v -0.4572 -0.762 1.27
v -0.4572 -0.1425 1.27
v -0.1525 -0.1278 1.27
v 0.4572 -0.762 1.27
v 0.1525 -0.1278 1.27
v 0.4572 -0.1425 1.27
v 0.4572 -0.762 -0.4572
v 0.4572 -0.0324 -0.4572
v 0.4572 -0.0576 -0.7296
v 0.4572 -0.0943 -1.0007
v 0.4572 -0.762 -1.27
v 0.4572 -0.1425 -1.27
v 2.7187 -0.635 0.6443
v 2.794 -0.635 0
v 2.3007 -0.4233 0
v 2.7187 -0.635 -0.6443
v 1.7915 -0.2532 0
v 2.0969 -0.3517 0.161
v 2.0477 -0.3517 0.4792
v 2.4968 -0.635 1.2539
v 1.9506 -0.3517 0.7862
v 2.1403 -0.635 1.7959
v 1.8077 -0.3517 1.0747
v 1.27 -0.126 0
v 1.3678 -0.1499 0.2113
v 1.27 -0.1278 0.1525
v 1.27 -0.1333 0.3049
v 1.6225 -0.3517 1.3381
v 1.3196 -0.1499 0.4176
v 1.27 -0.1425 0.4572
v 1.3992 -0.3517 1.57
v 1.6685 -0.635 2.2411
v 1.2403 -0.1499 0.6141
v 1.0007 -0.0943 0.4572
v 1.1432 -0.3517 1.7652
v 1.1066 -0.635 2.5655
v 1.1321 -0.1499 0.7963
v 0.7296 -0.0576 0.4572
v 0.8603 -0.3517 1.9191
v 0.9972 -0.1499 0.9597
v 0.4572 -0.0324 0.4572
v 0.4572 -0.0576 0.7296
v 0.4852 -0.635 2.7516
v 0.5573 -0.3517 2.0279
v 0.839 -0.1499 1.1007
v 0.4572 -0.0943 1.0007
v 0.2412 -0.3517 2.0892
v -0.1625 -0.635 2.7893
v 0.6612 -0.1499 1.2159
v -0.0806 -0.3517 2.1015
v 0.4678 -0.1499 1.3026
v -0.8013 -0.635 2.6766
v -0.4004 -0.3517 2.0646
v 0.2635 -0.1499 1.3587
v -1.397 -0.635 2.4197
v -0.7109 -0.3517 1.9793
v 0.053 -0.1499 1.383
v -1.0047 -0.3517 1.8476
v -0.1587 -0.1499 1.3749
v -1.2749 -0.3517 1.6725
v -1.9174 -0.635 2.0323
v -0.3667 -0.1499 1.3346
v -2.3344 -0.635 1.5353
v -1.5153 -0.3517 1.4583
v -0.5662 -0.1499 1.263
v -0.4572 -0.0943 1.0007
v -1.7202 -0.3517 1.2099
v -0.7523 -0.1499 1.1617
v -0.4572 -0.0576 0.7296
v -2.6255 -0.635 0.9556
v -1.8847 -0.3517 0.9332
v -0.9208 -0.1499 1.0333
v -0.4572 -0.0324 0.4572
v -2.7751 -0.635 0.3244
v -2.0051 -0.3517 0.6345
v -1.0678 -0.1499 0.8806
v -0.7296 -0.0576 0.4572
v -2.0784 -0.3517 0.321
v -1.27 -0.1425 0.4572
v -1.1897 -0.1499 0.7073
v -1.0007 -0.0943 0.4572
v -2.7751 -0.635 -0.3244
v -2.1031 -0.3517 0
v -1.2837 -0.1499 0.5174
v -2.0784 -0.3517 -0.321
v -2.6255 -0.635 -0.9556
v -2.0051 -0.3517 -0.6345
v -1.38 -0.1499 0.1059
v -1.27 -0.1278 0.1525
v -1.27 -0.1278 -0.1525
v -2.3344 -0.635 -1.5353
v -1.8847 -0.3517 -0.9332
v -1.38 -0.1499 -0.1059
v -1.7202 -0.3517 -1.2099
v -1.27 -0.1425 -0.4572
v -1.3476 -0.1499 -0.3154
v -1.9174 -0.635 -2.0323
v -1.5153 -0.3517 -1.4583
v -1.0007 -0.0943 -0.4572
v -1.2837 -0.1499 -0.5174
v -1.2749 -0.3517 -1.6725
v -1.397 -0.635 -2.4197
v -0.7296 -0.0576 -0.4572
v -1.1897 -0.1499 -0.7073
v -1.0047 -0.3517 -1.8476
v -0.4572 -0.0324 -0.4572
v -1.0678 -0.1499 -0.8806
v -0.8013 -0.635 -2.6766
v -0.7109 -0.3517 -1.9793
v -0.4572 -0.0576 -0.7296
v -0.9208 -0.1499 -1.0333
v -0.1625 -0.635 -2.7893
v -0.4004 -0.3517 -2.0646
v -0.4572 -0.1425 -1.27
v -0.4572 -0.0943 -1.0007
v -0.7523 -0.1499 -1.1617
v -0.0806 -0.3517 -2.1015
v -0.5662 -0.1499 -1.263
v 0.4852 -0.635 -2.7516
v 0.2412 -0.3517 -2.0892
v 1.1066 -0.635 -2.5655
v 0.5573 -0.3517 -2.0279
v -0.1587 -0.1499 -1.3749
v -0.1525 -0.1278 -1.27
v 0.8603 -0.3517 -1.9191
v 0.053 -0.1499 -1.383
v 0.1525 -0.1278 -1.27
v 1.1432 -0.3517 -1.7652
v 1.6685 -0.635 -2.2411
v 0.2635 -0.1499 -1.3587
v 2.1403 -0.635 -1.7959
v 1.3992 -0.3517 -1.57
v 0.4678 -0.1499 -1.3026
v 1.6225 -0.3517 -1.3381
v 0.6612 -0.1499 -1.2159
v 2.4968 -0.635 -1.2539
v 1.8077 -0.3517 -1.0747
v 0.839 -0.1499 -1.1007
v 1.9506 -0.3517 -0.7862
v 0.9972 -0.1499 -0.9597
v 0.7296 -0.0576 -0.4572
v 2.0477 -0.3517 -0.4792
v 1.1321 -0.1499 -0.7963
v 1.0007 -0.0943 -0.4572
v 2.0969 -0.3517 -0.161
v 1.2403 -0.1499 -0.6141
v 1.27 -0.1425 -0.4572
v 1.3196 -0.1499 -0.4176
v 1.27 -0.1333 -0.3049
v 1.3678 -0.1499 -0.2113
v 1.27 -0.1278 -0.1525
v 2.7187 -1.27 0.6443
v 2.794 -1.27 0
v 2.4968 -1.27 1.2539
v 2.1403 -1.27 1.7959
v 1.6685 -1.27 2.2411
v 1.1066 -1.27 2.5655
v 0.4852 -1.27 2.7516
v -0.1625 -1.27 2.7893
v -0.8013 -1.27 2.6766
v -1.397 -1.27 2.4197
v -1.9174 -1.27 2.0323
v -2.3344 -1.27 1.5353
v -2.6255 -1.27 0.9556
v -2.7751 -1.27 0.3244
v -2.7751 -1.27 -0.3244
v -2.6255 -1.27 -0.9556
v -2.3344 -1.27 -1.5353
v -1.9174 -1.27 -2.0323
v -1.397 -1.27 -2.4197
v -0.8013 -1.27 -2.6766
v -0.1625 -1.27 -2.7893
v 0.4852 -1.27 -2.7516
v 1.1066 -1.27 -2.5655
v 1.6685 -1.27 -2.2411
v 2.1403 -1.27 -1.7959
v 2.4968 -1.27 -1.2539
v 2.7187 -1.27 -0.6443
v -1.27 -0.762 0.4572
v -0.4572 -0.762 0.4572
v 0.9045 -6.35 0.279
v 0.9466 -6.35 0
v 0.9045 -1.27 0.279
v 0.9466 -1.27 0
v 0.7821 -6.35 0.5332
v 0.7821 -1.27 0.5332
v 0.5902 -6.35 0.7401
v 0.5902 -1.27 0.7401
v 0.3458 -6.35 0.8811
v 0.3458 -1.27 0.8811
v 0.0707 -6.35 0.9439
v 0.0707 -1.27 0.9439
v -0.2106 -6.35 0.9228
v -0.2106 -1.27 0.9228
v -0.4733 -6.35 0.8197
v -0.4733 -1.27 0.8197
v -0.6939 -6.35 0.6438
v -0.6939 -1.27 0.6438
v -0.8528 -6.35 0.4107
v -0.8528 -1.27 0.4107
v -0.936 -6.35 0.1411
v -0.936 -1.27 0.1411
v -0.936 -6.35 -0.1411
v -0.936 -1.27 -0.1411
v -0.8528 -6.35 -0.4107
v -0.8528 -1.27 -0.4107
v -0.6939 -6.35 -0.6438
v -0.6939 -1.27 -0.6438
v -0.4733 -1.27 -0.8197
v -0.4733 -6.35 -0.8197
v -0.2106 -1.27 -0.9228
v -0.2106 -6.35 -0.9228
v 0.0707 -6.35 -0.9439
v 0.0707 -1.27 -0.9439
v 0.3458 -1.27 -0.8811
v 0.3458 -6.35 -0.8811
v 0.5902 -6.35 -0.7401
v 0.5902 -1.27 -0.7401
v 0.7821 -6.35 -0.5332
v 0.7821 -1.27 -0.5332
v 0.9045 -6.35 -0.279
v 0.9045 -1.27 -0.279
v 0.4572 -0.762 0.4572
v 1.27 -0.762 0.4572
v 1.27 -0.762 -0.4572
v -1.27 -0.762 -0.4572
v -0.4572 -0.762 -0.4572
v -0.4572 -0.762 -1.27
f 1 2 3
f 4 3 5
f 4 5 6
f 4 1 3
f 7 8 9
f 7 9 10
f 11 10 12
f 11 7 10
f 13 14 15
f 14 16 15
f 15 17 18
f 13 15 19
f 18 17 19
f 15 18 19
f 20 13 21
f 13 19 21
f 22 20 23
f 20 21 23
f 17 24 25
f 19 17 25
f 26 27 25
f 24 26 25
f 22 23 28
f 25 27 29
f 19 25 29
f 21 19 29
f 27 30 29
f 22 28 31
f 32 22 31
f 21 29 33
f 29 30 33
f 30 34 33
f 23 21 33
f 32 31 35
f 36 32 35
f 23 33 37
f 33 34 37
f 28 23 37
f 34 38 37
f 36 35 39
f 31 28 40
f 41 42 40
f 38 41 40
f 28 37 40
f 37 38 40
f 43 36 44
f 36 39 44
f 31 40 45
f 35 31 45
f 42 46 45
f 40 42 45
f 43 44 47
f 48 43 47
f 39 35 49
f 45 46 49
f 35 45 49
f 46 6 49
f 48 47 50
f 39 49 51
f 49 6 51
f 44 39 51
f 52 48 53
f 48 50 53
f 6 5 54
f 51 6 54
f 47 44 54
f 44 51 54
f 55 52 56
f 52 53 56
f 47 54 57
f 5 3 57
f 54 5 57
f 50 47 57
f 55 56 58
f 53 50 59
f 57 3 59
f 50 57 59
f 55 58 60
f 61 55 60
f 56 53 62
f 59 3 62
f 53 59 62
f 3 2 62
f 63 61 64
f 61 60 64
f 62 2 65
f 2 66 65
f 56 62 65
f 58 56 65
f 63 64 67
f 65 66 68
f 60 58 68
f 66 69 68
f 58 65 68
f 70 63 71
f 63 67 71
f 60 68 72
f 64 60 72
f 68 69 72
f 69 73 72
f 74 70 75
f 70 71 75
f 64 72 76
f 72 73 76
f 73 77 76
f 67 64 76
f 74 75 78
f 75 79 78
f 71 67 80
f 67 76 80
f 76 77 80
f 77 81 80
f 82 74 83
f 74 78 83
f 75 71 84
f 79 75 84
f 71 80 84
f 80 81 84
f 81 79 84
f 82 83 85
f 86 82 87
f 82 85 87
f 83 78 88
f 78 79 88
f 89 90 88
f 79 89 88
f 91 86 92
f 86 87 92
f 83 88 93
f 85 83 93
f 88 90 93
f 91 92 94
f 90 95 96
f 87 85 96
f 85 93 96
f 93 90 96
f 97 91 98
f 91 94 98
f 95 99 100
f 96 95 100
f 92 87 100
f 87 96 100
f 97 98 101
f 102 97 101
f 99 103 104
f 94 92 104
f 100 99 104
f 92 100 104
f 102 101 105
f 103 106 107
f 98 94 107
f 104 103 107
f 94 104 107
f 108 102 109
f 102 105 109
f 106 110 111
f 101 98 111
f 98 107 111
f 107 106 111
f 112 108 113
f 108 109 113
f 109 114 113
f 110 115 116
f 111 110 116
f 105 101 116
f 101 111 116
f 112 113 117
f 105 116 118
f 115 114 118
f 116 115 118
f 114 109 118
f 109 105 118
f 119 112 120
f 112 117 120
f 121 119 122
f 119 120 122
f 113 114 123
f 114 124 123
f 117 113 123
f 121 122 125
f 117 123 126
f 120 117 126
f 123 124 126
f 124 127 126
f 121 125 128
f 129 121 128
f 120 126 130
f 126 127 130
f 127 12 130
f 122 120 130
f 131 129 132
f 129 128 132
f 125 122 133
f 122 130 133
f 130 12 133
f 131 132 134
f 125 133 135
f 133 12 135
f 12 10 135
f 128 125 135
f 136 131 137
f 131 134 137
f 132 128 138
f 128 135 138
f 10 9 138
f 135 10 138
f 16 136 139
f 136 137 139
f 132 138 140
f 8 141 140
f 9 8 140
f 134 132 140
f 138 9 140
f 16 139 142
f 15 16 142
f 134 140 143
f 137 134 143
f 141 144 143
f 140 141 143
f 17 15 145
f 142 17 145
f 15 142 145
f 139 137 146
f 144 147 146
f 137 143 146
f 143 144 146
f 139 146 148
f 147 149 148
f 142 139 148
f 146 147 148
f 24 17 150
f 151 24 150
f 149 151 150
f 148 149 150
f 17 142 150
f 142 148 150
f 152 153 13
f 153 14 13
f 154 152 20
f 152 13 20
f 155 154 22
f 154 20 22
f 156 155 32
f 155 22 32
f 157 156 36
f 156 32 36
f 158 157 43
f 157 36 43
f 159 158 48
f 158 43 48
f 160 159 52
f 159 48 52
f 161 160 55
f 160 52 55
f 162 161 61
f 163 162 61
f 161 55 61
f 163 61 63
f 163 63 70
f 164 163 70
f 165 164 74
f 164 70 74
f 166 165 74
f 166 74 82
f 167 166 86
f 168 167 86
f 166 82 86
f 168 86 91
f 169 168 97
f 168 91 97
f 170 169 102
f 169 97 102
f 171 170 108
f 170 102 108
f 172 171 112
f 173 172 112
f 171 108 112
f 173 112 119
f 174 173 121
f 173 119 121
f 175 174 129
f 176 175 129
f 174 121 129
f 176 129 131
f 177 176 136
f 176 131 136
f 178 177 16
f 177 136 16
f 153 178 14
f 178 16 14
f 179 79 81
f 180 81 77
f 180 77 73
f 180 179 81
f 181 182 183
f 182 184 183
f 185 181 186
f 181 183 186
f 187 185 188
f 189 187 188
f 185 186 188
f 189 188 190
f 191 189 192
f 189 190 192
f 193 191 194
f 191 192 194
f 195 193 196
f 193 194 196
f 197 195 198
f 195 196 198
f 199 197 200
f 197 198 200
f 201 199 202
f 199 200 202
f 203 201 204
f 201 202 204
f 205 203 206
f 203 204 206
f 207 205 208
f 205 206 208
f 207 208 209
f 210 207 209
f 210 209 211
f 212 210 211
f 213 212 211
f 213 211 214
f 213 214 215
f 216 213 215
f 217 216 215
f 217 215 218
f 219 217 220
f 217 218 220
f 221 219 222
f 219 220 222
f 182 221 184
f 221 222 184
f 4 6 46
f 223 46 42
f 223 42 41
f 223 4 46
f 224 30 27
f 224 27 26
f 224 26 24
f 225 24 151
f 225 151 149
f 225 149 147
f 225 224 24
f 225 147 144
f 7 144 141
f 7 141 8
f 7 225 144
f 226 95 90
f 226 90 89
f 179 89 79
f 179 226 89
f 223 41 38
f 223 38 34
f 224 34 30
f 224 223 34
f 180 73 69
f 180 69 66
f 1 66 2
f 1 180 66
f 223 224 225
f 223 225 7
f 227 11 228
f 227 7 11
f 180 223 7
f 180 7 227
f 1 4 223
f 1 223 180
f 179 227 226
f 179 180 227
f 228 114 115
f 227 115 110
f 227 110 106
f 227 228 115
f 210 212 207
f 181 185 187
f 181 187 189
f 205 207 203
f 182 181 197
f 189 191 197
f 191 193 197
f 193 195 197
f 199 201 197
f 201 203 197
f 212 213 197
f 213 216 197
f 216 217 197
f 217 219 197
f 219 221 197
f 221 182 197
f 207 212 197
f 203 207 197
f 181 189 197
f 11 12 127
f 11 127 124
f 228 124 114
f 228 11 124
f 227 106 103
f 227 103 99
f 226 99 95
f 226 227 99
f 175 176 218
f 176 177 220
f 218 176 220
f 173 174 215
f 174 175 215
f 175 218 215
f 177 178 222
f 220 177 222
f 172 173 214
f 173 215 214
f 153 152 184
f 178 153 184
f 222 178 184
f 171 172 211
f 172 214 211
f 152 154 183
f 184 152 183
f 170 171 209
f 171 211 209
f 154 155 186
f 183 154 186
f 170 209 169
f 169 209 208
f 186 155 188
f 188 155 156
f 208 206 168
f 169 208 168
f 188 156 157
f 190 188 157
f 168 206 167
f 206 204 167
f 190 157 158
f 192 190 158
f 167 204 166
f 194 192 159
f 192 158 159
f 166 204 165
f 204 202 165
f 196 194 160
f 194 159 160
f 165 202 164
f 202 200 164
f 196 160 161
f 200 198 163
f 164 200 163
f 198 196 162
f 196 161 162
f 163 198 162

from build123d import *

# Parameters (mm, degrees)
EXTRUDE1_DEPTH = 2.54


with BuildPart() as part:
    # Sketch1 → Revolve1 (revolve)
    with BuildSketch(Plane.XY):
        with BuildLine():
            Line((0, 0), (0, -6.35))
            Line((0, -6.35), (0.946564988, -6.35))
            Line((0.946564988, -6.35), (0.946564988, -1.27))
            Line((0.946564988, -1.27), (2.794, -1.27))
            Line((2.794, -1.27), (2.794, -0.635))
            ThreePointArc((2.794, -0.635), (1.4326253, -0.16074868), (0, 0))
        make_face()
    revolve(axis=Axis((0, 0, 0), (0, -1, 0)))

    # Sketch2 → Extrude1 (cut)
    with BuildSketch(Plane.XZ.offset(0.762)):
        Polygon((0.4572, -1.27), (-0.4572, -1.27), (-0.4572, -0.4572), (-1.27, -0.4572), (-1.27, 0.4572), (-0.4572, 0.4572), (-0.4572, 1.27), (0.4572, 1.27), (0.4572, 0.4572), (1.27, 0.4572), (1.27, -0.4572), (0.4572, -0.4572), align=None)
    extrude(amount=-EXTRUDE1_DEPTH, mode=Mode.SUBTRACT)


solid = part.part
